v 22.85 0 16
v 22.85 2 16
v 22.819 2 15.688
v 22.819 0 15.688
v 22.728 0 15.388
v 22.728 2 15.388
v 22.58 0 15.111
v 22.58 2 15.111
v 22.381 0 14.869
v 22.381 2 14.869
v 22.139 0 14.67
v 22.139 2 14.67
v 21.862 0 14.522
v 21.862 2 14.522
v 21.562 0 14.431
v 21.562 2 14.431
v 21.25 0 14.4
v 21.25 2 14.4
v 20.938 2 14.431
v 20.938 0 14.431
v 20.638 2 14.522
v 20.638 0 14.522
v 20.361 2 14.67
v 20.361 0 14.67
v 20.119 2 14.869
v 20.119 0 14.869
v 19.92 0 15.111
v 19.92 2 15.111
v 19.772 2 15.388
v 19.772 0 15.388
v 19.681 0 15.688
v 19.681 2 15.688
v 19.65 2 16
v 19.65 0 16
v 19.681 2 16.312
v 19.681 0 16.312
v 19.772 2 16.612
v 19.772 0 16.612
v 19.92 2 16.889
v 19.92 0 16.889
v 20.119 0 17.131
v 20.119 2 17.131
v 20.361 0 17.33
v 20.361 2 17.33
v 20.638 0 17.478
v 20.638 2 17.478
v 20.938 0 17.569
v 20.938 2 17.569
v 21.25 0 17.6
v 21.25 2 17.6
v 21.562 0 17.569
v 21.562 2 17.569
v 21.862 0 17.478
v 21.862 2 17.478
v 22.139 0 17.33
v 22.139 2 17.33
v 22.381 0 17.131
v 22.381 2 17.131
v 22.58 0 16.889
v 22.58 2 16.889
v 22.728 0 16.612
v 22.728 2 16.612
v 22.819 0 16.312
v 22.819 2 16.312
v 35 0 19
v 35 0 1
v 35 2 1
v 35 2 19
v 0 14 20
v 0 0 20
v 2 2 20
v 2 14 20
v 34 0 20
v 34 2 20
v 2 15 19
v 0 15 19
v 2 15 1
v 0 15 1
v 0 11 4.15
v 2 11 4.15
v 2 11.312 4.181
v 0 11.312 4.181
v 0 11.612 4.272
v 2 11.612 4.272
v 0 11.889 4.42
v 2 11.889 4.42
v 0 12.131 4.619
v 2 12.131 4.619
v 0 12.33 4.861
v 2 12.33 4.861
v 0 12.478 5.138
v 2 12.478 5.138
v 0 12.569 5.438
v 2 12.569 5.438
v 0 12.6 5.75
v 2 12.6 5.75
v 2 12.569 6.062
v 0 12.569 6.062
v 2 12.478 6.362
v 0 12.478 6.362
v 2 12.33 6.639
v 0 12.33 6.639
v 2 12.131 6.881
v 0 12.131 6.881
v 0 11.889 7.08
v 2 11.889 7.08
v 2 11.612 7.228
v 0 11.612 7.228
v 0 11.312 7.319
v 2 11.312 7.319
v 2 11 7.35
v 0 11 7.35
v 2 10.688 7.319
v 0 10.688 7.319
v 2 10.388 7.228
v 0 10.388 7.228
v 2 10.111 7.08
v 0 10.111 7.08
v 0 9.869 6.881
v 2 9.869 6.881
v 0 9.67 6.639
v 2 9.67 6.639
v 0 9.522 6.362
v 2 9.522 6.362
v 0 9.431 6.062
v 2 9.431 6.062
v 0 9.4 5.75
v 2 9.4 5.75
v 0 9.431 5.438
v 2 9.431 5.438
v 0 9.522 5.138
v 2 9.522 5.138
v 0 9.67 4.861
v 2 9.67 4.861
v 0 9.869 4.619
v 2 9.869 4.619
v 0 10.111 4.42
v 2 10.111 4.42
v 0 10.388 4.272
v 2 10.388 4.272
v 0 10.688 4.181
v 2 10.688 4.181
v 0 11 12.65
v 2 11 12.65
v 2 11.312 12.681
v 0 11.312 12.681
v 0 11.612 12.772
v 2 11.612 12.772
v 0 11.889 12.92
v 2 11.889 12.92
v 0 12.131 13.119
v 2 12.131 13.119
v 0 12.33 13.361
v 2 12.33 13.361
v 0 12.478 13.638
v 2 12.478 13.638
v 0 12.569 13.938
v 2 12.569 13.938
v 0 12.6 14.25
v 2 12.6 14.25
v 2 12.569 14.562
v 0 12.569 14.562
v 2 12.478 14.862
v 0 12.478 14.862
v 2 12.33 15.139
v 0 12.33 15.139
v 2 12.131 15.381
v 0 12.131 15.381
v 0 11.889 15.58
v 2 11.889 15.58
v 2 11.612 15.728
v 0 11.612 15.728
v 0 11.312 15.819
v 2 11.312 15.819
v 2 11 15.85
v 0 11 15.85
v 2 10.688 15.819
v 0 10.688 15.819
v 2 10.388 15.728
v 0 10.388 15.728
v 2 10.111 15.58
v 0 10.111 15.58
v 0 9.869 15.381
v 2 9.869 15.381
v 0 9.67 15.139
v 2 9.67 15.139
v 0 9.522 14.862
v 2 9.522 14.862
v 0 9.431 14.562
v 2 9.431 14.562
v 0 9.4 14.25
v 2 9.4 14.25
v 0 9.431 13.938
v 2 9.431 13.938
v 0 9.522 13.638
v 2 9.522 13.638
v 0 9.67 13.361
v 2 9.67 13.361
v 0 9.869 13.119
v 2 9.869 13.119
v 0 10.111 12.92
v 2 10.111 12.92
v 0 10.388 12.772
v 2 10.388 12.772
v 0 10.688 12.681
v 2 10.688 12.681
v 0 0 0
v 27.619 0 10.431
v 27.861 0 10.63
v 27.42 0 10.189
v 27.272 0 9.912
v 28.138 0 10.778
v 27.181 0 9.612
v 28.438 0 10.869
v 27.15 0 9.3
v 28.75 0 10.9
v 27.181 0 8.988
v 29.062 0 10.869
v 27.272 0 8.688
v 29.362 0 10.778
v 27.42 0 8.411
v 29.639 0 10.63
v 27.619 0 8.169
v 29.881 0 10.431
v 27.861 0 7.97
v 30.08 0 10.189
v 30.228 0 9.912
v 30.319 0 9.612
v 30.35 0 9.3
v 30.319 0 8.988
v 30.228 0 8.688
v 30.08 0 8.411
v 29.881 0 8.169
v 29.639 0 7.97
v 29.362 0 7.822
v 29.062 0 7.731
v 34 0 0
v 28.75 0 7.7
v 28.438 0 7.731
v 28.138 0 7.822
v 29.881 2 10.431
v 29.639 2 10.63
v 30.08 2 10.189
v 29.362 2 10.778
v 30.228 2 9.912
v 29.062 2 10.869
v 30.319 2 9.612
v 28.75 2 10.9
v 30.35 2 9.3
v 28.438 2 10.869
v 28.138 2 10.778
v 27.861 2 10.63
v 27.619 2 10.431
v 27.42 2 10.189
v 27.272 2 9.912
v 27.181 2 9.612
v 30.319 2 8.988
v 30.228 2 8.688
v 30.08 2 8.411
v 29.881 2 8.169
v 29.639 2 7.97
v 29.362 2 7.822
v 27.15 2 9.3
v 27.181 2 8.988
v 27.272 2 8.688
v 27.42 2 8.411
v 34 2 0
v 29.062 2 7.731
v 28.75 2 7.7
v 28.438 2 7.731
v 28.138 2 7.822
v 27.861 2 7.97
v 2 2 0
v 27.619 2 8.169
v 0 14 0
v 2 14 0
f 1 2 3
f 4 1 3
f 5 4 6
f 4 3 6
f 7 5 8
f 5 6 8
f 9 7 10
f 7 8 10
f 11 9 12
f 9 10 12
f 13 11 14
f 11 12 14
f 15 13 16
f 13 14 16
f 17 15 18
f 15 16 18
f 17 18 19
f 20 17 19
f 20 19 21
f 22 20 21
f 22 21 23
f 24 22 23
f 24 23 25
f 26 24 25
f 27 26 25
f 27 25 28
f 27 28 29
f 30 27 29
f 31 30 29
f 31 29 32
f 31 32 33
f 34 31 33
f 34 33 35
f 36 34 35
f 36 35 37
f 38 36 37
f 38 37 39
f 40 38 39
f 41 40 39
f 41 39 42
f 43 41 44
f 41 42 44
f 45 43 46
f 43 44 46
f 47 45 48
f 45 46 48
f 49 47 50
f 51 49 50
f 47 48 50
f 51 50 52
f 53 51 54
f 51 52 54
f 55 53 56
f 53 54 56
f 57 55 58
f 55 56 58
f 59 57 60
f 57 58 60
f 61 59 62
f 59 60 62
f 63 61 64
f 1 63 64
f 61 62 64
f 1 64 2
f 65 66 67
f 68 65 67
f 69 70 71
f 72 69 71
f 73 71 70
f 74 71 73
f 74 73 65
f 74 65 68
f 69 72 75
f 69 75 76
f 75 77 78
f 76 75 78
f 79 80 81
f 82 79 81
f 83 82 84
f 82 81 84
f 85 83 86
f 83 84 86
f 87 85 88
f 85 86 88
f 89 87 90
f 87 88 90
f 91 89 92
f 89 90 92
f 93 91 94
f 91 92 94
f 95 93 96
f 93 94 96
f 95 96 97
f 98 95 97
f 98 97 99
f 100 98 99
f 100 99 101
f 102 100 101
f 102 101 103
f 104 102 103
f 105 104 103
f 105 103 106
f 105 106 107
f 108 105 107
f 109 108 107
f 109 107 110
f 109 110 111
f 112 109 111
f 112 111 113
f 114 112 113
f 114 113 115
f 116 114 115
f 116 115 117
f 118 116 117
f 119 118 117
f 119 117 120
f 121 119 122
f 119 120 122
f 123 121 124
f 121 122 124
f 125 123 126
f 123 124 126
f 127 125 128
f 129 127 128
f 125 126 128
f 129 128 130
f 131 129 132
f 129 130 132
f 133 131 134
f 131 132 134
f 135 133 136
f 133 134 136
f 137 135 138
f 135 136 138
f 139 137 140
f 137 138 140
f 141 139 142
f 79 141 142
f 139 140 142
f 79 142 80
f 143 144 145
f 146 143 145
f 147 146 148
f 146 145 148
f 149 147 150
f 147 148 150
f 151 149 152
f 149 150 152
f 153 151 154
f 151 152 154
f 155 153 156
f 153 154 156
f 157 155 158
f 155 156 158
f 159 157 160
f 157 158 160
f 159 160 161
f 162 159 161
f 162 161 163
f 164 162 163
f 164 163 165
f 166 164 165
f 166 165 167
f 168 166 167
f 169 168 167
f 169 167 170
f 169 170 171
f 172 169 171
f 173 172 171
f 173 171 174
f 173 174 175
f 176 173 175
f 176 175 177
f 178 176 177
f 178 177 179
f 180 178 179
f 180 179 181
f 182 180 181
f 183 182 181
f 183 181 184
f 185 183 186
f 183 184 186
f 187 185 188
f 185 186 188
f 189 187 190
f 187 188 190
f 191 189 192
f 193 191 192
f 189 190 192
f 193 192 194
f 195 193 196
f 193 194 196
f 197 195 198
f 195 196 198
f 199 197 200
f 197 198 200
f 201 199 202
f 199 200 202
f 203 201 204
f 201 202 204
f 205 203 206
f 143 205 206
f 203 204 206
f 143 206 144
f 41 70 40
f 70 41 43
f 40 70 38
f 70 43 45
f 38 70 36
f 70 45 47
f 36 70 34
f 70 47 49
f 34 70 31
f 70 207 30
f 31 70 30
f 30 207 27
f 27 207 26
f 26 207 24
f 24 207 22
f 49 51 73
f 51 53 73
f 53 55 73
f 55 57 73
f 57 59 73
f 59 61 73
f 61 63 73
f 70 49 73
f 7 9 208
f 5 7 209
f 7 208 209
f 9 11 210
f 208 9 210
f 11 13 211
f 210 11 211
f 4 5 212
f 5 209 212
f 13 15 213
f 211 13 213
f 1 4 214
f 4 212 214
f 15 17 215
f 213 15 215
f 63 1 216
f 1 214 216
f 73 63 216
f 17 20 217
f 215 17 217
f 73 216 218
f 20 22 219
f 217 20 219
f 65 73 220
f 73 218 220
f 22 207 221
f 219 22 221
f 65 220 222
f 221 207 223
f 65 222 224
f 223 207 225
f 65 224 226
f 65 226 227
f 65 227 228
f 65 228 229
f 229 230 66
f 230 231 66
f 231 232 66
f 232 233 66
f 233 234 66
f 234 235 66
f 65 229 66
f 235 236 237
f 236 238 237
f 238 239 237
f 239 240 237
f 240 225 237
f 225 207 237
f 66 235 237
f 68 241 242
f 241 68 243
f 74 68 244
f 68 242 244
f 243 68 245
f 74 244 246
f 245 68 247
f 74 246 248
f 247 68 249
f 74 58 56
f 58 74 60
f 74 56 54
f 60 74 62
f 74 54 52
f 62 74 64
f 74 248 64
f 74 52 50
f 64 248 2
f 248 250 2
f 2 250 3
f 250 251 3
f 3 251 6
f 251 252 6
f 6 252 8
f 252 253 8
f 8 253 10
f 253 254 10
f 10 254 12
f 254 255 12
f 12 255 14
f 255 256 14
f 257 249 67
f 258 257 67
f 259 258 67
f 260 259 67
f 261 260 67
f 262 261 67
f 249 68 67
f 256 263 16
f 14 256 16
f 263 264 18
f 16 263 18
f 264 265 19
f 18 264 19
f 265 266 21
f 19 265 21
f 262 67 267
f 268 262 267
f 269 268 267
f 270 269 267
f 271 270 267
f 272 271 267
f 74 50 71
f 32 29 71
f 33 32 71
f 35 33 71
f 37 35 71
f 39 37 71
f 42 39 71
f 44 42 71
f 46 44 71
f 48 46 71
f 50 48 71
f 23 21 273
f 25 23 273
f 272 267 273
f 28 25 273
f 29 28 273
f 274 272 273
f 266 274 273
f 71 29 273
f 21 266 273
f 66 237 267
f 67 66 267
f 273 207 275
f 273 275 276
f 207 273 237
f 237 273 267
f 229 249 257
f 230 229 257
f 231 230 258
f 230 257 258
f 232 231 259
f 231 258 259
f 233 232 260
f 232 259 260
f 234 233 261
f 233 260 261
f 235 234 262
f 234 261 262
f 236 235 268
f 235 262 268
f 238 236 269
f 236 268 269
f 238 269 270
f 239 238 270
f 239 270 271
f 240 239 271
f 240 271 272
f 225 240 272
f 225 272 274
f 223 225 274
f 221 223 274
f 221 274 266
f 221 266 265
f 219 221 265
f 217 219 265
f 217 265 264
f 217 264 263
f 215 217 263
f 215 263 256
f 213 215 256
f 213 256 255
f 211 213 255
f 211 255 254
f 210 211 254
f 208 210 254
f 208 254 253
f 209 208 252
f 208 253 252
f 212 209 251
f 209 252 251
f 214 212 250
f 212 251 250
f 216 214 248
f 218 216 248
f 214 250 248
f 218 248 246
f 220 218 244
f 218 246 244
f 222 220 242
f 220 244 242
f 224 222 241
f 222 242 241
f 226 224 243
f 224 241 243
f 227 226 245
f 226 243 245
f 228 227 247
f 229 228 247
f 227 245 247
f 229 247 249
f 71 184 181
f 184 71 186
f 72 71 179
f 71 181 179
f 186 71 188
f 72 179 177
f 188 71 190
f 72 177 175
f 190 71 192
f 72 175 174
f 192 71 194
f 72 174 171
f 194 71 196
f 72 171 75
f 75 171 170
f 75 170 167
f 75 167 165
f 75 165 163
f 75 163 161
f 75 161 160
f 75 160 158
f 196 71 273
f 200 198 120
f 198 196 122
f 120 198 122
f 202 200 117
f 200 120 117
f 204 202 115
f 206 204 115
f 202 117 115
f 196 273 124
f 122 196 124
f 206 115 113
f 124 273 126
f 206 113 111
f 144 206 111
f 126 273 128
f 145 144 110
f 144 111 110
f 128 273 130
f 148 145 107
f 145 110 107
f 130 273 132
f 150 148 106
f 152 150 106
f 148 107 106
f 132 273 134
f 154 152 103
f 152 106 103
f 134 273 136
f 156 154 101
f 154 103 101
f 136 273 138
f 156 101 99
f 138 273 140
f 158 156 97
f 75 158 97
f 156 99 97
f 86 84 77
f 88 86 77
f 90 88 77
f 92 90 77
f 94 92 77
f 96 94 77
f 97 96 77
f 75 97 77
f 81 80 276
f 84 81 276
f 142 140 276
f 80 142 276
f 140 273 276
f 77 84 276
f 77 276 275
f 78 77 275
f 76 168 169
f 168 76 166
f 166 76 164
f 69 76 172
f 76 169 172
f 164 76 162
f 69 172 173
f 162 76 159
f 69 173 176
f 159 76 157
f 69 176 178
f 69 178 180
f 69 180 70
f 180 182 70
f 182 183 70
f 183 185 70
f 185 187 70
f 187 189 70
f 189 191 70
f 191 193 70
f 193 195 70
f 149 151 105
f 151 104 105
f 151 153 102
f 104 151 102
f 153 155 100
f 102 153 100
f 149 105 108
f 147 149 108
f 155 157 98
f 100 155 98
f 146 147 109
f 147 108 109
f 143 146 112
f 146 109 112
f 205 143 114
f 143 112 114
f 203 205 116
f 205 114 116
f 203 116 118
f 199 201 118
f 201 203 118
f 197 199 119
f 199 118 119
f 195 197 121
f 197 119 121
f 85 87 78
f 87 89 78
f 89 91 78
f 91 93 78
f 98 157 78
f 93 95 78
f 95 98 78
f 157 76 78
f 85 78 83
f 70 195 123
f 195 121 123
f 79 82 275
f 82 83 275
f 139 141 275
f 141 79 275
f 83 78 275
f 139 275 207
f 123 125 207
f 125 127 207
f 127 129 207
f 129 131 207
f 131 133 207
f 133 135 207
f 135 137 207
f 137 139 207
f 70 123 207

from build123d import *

# Parameters (mm, degrees)
BASE_DEPTH                 = 20
CHAMFER1_SIZE              = 1
F_3_2_3_2_MOUNTSIDE_D      = 3.2
F_3_2_3_2_CABLECHAINSIDE_D = 3.2


with BuildPart() as part:
    # Sketch1 → Base (new body)
    with BuildSketch(Plane.XY):
        Polygon((0, 0), (35, 0), (35, 2), (2, 2), (2, 15), (0, 15), align=None)
    extrude(amount=BASE_DEPTH)

    # Chamfer1
    chamfer1_edges = [part.edges().sort_by_distance(p)[0] for p in [
        (35, 1, 20),
        (1, 15, 20),
        (1, 15, 0),
        (35, 1, 0),
    ]]
    chamfer(chamfer1_edges, length=CHAMFER1_SIZE)

    # Ø3.2 (3.2) MountSide (through all)
    with Locations(Plane.ZY):
        with Locations((5.75, 11), (14.25, 11)):
            Hole(F_3_2_3_2_MOUNTSIDE_D / 2)

    # Ø3.2 (3.2) CableChainSide (through all)
    with Locations(Plane(origin=(0, 0, 0), x_dir=(-1, 0, 0), z_dir=(0, -1, 0))):
        with Locations((-28.75, -9.3), (-21.25, -16)):
            Hole(F_3_2_3_2_CABLECHAINSIDE_D / 2)


solid = part.part
